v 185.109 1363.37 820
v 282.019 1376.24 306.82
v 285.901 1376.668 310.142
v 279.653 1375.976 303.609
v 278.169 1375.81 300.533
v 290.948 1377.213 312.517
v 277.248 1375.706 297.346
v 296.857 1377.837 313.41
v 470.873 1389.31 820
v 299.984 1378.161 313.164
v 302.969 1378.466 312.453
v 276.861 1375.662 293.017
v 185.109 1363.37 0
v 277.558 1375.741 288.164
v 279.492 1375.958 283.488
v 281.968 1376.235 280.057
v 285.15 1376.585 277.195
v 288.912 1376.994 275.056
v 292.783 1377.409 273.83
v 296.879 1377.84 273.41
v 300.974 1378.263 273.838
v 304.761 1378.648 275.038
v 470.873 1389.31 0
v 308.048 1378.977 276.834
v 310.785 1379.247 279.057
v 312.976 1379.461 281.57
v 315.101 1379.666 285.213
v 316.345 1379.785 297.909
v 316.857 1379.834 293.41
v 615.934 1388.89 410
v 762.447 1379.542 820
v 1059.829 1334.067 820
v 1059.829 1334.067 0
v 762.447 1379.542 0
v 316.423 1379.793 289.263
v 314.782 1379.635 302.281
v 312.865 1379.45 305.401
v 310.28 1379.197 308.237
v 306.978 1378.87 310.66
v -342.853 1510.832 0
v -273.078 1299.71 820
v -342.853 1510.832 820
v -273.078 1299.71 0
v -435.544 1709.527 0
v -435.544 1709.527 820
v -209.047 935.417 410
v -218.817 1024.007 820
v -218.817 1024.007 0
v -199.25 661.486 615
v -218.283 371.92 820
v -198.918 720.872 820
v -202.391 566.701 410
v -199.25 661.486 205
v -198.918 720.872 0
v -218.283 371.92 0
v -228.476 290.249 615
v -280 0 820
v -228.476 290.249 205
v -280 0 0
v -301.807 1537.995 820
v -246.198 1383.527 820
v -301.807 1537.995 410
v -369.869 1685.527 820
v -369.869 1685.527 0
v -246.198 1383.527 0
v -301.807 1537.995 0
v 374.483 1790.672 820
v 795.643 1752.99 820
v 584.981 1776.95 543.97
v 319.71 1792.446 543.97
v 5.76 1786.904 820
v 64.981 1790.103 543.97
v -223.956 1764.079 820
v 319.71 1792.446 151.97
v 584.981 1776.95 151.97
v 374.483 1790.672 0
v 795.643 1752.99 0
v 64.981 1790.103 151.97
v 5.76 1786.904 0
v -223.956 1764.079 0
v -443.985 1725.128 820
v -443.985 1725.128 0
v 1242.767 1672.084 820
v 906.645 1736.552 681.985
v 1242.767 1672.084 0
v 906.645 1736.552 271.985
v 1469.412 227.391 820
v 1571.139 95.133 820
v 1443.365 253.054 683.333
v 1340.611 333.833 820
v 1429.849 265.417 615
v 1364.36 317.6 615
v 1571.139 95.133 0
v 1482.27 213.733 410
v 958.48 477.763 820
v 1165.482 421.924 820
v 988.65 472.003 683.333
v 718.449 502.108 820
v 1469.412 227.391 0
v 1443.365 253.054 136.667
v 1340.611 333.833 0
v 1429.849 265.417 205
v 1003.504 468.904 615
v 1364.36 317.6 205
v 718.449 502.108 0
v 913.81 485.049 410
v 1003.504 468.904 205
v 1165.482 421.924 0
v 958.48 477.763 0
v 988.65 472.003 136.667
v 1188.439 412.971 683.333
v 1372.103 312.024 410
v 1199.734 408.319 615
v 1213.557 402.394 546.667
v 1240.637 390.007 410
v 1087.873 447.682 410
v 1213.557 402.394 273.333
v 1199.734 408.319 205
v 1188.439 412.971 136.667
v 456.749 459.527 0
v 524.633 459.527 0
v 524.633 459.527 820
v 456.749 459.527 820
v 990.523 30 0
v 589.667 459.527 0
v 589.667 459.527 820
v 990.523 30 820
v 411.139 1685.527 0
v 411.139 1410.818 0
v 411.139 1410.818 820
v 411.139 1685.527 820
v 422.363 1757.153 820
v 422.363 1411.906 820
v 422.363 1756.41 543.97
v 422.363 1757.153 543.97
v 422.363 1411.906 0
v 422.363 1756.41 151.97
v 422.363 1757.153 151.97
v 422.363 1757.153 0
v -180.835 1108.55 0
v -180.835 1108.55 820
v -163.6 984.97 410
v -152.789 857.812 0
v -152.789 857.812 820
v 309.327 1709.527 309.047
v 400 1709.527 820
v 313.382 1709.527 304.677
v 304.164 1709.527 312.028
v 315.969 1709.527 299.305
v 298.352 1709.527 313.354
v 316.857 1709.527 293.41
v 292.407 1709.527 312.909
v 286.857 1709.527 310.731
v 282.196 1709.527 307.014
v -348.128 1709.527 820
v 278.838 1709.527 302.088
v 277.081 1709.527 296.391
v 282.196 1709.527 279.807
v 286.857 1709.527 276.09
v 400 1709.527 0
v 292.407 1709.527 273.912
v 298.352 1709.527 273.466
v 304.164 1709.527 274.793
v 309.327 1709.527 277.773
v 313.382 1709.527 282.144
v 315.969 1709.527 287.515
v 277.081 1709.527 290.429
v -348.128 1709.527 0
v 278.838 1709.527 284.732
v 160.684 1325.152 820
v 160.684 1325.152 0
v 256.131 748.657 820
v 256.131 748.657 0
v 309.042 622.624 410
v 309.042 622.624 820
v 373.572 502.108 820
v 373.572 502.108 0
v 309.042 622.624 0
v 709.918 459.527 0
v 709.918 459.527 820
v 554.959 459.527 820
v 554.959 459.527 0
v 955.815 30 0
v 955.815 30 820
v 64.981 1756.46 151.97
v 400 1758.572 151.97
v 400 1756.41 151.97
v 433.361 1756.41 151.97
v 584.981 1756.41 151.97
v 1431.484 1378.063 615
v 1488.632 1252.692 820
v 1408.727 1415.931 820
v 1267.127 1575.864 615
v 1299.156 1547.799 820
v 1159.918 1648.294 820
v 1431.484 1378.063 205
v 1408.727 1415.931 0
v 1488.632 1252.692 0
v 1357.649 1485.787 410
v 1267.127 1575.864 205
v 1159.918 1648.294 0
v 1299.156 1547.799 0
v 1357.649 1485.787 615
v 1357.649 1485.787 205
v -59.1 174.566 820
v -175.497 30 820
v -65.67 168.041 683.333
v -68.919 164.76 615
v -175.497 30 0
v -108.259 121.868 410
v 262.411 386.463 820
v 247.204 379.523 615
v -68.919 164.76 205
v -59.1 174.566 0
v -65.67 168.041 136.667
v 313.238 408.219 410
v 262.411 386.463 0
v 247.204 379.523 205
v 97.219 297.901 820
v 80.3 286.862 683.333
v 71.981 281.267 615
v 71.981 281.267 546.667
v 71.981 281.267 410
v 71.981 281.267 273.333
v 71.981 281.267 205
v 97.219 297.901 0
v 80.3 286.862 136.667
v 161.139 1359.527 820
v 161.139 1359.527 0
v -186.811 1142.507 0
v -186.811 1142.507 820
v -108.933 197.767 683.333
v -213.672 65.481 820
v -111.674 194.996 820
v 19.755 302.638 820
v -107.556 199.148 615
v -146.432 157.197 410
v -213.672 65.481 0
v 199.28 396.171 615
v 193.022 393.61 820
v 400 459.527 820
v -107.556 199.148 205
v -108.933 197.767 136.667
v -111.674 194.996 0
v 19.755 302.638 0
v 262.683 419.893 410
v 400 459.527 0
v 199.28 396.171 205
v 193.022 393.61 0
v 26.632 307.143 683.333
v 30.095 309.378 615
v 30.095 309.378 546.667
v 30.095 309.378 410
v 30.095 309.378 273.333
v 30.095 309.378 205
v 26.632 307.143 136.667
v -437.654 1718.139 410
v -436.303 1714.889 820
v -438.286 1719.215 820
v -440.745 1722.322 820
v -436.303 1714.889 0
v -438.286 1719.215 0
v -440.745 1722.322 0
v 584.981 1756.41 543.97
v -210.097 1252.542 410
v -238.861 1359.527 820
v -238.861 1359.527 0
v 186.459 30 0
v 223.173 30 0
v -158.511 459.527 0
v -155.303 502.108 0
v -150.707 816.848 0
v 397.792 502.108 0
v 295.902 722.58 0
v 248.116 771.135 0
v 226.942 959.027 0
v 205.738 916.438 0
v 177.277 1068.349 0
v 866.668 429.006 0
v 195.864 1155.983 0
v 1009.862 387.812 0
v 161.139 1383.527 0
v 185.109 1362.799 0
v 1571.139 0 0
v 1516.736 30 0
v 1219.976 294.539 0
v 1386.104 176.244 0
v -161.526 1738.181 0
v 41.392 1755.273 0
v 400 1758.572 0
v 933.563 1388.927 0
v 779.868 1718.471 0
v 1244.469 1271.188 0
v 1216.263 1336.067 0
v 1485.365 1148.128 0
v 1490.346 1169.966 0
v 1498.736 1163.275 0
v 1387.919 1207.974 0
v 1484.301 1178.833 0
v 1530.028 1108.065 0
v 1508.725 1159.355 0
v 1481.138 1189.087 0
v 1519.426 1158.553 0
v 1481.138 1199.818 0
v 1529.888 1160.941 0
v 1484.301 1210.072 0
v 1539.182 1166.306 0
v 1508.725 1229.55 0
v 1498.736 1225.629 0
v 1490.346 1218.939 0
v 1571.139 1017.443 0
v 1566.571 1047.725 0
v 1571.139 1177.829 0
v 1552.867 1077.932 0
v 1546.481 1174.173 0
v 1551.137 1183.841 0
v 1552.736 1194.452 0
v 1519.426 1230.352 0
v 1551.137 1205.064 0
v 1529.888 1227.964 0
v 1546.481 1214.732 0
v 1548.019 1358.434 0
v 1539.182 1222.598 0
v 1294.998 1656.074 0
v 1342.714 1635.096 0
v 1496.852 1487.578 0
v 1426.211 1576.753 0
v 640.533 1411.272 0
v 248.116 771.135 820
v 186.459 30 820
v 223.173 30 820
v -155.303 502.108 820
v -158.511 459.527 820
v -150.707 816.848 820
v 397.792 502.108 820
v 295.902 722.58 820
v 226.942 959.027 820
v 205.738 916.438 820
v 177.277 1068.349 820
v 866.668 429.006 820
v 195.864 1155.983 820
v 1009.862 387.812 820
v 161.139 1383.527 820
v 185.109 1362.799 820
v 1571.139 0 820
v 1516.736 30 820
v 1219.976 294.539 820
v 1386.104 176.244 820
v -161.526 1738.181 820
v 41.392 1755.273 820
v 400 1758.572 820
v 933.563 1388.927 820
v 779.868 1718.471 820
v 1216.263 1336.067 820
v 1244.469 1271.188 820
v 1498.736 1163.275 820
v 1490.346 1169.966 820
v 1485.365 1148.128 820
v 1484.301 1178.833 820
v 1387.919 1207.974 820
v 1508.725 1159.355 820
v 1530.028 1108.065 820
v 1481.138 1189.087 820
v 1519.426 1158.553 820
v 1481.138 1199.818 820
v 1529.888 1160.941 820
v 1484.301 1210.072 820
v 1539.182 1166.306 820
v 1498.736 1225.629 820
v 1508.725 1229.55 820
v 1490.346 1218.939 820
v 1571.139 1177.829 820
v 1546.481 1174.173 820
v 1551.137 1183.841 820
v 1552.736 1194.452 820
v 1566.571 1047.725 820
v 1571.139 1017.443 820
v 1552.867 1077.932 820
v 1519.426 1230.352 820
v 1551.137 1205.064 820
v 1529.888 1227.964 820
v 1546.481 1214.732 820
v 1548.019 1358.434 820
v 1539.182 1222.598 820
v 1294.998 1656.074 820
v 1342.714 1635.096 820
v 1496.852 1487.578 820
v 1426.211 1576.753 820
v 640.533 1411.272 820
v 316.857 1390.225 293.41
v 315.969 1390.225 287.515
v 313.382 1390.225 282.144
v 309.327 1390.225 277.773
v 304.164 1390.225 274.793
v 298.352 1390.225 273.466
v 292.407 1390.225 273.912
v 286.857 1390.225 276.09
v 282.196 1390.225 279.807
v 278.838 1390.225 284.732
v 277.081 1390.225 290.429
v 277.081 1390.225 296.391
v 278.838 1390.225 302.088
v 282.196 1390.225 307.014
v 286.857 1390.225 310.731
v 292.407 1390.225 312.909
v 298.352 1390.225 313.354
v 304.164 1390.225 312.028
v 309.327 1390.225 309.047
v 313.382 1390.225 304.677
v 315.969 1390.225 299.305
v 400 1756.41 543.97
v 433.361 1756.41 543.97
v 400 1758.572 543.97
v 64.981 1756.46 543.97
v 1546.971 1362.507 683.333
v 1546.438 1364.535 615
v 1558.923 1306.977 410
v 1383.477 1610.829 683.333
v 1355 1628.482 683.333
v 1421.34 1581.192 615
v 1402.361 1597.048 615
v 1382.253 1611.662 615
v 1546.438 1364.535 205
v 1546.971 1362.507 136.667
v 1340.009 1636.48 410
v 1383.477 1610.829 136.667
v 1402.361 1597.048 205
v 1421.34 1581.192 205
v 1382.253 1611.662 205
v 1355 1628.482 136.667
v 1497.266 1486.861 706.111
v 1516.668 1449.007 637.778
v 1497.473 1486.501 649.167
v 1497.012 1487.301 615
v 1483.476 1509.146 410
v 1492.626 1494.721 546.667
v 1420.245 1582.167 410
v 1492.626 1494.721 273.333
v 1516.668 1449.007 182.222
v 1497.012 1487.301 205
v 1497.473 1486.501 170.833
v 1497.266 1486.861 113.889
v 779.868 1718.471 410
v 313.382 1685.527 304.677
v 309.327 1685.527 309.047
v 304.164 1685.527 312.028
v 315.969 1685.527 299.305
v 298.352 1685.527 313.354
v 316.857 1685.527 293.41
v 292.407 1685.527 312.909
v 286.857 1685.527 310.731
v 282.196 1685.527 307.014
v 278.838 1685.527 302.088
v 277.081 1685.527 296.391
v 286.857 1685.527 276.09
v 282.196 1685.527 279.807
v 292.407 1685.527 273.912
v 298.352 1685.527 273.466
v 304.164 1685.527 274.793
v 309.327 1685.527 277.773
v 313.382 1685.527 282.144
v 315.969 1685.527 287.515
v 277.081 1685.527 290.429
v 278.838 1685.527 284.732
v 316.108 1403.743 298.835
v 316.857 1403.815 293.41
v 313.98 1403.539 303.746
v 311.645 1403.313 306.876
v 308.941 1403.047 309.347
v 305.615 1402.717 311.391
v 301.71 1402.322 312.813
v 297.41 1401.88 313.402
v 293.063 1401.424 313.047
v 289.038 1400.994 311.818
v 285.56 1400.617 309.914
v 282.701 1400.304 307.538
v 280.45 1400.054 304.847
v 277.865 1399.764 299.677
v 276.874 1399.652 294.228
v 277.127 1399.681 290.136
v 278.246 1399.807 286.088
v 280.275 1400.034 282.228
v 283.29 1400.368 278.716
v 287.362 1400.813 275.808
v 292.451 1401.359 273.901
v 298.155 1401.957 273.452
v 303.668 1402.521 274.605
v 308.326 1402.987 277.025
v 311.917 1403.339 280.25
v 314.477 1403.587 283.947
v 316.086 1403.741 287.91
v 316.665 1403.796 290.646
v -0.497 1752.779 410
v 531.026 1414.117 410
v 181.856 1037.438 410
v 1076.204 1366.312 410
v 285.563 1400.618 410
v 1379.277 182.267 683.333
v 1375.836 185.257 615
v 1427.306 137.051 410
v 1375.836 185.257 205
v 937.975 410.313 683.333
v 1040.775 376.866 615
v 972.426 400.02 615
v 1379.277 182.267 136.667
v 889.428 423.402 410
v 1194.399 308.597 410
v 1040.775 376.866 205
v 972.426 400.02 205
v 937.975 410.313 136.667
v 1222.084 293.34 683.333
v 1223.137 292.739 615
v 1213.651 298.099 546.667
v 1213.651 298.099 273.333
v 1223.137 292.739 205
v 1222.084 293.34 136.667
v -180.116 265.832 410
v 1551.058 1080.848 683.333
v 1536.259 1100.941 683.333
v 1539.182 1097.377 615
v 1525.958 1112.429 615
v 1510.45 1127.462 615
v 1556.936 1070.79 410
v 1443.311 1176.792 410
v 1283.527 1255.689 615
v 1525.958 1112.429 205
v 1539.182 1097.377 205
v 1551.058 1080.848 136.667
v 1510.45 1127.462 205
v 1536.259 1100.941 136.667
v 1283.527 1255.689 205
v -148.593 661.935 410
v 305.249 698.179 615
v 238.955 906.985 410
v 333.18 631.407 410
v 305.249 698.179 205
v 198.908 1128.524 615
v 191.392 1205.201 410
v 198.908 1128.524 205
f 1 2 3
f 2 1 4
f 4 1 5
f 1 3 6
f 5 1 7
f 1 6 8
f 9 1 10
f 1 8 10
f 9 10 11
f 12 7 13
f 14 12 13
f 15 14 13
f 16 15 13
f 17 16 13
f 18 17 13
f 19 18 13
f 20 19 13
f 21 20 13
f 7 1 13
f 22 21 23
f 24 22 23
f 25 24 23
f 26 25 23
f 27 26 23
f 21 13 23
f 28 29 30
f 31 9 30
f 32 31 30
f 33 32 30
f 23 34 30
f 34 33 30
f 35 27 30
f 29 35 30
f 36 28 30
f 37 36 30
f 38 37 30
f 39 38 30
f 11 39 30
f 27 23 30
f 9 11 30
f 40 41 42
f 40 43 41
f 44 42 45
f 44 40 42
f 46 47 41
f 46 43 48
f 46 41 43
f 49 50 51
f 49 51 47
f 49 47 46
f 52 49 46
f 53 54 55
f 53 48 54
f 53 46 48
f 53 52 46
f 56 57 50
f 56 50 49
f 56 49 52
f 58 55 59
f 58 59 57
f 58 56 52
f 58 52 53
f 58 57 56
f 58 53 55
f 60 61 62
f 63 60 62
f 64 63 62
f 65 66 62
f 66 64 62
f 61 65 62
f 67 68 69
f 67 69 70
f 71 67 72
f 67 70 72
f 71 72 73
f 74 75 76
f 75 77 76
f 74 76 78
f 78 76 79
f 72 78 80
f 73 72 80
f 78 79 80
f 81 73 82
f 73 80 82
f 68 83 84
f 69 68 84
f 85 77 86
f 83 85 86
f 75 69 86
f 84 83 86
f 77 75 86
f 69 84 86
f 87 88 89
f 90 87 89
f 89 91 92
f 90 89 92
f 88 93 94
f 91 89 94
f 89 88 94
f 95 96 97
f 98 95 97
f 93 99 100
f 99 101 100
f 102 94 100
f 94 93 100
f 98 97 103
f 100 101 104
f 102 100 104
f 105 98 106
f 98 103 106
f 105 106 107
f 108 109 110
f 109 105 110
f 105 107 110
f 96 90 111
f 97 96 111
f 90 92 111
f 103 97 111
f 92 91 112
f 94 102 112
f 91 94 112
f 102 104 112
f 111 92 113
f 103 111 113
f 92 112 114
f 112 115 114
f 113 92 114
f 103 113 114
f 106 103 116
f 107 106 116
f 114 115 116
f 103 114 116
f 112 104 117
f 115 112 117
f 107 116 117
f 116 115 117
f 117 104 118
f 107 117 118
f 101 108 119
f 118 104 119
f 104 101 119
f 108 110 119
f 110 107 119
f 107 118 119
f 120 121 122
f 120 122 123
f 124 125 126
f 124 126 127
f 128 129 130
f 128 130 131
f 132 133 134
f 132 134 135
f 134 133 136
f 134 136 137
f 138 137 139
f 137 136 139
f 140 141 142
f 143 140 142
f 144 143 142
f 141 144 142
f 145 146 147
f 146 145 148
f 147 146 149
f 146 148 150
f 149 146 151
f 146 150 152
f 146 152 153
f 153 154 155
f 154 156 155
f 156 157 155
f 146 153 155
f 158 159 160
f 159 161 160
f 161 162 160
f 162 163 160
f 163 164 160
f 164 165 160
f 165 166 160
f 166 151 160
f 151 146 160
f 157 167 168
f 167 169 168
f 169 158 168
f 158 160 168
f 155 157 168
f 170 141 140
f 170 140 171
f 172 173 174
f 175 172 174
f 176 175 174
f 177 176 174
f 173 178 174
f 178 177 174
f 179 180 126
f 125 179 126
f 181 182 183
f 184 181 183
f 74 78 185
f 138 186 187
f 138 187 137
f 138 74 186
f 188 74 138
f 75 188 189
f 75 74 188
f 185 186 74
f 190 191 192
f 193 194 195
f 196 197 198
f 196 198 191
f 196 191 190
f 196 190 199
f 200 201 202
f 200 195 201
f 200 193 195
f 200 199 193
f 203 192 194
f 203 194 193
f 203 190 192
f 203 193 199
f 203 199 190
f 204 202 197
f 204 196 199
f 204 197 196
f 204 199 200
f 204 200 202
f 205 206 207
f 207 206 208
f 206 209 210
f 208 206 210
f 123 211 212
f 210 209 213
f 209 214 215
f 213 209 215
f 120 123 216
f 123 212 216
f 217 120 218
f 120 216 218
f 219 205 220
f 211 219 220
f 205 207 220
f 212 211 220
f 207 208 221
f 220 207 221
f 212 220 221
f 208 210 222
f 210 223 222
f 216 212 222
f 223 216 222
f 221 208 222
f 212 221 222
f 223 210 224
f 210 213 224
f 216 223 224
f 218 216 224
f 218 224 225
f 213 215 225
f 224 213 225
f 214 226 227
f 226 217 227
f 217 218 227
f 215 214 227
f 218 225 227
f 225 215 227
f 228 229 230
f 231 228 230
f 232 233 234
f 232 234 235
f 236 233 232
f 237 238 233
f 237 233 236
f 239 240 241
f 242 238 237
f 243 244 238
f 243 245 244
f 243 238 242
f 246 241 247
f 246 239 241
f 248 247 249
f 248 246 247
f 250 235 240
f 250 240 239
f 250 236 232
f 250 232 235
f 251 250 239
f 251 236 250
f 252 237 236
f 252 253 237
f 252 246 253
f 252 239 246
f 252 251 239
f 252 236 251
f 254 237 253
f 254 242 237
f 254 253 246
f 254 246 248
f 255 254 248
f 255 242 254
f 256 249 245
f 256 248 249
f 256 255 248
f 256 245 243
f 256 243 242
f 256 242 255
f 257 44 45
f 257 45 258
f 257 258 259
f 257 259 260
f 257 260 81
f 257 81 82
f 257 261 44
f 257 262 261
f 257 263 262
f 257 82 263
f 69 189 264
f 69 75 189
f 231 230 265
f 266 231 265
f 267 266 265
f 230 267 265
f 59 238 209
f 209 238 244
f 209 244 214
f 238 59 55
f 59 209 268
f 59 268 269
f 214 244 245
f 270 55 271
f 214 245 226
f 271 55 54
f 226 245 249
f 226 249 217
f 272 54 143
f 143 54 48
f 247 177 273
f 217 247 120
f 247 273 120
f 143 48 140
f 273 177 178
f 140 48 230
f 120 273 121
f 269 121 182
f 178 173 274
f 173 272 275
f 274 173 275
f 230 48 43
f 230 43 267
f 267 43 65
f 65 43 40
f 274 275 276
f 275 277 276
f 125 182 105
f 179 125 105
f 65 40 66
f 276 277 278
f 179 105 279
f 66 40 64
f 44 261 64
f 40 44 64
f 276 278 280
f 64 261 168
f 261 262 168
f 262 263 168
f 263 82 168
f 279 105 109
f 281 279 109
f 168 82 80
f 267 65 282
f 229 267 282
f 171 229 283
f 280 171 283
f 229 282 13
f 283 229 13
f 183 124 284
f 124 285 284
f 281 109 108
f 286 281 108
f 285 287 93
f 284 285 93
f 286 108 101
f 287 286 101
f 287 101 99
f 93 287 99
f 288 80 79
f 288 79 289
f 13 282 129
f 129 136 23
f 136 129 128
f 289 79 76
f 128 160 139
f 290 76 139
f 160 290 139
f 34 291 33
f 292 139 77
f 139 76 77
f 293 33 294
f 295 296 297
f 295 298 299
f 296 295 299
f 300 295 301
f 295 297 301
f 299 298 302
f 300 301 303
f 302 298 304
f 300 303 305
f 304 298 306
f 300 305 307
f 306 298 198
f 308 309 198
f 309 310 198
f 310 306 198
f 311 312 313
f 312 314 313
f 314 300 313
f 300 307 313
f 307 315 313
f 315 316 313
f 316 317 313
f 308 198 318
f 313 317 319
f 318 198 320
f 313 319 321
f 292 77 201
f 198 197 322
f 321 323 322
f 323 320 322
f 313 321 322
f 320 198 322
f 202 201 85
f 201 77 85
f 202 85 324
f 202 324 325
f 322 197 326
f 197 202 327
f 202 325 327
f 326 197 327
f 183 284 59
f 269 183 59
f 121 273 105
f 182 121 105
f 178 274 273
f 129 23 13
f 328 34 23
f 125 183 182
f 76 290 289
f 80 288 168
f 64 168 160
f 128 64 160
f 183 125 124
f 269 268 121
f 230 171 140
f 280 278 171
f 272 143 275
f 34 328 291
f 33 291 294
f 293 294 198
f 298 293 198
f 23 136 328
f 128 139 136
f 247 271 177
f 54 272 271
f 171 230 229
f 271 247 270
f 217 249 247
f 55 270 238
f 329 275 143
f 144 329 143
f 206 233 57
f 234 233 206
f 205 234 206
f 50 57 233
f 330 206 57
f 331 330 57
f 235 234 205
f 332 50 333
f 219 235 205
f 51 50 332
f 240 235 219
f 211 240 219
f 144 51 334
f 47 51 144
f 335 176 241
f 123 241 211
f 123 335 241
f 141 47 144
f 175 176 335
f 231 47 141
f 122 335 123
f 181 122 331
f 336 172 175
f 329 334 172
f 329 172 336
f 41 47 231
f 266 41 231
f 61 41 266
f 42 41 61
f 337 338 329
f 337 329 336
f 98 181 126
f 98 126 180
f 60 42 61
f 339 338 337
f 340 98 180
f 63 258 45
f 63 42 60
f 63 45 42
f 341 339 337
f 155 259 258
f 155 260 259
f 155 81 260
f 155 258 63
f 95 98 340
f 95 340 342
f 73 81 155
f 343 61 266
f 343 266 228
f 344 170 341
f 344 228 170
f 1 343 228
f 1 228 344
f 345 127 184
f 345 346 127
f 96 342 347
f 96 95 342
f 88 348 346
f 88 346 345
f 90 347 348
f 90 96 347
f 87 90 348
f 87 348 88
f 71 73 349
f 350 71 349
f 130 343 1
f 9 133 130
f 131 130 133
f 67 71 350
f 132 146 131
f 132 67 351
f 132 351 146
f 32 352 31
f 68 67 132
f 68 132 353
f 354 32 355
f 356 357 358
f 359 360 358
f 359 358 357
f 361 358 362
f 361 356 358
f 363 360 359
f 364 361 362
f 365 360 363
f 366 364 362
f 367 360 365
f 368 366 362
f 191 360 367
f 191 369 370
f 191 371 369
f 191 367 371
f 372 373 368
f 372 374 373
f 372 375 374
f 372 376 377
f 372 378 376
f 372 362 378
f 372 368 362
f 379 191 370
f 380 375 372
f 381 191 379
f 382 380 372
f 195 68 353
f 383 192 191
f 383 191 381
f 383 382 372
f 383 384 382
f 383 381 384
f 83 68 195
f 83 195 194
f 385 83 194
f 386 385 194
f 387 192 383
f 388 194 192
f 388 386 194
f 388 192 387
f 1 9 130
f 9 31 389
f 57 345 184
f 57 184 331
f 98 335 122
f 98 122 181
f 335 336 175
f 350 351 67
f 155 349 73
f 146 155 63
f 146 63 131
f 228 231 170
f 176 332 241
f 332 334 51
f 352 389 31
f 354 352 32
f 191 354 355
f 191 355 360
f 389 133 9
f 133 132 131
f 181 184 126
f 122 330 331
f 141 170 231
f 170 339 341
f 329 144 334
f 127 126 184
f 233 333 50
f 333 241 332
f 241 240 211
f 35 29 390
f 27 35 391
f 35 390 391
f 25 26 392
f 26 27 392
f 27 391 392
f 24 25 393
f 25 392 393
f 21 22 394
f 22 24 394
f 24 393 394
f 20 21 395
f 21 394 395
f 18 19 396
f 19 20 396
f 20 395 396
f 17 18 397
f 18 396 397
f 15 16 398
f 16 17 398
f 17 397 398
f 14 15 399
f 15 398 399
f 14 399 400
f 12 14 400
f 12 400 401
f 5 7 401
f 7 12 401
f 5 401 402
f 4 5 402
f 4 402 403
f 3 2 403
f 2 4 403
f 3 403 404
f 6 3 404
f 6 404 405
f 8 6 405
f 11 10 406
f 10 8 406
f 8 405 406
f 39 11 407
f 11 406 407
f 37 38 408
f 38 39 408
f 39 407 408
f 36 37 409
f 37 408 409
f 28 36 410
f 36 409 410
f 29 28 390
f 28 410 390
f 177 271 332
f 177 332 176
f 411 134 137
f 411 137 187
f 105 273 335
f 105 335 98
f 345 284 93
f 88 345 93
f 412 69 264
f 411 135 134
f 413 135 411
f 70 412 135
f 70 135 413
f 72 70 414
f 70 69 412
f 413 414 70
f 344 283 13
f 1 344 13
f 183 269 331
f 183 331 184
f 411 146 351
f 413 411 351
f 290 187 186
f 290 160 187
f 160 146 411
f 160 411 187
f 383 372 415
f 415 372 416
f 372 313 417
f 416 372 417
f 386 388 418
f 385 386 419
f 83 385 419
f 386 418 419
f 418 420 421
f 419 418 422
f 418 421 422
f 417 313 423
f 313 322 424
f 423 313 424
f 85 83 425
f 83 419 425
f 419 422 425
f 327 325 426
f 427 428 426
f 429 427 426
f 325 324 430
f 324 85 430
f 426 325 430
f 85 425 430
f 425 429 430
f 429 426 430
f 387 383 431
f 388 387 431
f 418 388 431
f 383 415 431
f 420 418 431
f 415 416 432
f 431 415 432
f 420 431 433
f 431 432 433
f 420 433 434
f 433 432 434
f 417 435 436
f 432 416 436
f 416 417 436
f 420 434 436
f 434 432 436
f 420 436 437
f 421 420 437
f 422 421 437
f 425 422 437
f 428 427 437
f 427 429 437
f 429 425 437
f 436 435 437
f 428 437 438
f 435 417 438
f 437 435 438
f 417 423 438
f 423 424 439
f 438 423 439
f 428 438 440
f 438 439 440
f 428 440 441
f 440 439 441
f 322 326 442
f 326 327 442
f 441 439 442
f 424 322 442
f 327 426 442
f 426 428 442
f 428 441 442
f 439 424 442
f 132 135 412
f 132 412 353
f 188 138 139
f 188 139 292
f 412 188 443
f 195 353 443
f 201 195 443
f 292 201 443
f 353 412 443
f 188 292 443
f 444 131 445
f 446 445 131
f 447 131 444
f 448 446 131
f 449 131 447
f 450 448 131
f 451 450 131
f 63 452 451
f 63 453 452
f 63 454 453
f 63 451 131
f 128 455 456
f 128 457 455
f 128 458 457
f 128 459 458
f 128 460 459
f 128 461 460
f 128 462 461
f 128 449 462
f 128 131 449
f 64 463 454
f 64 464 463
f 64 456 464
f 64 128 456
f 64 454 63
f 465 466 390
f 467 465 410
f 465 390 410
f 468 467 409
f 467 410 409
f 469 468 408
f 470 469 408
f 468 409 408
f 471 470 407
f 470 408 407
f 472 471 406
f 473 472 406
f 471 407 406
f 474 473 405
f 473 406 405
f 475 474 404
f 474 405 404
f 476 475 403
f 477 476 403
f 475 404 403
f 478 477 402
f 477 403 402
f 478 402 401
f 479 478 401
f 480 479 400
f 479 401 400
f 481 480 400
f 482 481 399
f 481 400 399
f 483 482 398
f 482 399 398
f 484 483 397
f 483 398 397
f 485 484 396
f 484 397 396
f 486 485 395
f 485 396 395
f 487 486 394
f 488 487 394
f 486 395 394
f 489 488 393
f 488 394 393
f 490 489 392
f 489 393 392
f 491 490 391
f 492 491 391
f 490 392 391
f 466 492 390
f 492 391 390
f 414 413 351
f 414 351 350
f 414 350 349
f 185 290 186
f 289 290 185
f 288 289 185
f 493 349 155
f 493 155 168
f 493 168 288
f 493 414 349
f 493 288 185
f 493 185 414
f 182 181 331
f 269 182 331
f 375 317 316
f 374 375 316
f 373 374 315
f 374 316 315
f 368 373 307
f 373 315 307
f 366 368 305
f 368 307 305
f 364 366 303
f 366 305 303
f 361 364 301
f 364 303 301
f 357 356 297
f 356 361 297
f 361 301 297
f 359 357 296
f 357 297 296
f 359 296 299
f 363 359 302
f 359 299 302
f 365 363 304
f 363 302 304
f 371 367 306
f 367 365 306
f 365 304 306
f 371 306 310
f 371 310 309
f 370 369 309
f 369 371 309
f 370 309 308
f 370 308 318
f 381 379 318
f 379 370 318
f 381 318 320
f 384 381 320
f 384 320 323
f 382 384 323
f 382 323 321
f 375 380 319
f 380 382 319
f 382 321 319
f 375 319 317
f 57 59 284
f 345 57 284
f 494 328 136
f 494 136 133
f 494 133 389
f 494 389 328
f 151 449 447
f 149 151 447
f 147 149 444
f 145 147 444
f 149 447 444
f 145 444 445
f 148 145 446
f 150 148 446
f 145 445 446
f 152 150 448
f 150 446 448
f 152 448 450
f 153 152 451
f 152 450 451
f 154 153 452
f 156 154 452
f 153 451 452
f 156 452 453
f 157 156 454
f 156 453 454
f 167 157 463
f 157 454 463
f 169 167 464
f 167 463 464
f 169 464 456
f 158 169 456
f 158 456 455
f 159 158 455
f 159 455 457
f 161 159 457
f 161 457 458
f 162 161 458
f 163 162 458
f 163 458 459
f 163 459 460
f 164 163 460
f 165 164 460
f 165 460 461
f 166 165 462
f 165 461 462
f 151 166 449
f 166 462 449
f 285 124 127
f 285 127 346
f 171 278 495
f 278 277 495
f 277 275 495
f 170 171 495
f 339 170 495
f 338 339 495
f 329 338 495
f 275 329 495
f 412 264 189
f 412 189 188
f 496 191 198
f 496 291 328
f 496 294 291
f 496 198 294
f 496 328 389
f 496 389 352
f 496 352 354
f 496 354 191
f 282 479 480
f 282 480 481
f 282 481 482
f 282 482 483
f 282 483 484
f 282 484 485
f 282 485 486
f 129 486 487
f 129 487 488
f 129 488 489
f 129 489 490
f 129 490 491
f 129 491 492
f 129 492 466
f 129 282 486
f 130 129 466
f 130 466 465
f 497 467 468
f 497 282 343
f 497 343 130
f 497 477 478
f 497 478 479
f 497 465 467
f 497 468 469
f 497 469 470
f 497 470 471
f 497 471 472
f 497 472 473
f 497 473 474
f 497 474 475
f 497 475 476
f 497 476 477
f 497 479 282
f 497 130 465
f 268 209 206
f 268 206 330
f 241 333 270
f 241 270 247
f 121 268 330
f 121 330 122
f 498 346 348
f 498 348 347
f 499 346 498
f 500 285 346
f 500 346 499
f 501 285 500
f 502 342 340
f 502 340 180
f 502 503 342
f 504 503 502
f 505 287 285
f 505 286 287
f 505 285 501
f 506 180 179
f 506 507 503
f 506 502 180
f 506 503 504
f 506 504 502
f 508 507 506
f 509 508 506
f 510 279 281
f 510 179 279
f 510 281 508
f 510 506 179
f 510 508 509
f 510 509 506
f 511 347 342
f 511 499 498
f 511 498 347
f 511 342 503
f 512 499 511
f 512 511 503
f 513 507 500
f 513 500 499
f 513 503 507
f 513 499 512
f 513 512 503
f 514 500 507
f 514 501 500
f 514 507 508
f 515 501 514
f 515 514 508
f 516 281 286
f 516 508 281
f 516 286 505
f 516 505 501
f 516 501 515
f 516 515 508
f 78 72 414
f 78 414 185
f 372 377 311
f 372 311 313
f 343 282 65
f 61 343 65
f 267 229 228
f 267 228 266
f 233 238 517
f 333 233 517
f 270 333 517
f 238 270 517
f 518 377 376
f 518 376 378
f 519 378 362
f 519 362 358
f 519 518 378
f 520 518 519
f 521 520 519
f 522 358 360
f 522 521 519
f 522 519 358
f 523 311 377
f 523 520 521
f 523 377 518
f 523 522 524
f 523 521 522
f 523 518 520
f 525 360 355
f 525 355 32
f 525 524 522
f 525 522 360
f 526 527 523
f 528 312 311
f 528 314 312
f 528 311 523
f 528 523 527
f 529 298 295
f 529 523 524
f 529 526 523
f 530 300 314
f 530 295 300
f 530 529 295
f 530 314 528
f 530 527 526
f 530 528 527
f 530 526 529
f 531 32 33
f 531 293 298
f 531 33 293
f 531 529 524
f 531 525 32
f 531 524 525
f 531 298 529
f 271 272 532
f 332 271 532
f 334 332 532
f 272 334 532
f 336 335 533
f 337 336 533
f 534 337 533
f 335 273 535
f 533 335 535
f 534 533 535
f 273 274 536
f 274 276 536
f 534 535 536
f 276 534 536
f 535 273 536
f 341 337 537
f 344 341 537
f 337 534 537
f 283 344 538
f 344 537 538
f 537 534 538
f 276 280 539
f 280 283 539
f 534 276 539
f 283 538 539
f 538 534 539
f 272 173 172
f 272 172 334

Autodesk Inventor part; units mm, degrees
ref_plane "YZ Plane" through (0, 0, 0) normal (1, 0, 0) x (0, 1, 0)
sketch "Sketch1" plane through (0, 0, 0) normal (0, 0, 1) x (1, 0, 0)
  line L0 (161.1386, 1359.5266) -> (-238.8614, 1359.5266)
  line L1 (161.1386, 1359.5266) -> (-238.8612, 1359.5253)
  line L2 (161.1386, 1359.5266) -> (-238.8613, 1359.5262)
  line L3 (161.1386, 1359.5266) -> (-186.8113, 1142.5066)
  line L4 (248.1161, 771.1351) -> (-152.7891, 857.8121)
  line L5 (-158.5114, 459.5266) -> (400, 459.5266)
  line L6 (-32.9752, 356.2519) -> (400, 459.5266) construction
  spline S0 degree 2 poles (-213.6716, 65.4814) (-32.9752, 356.2519) (400, 459.5266) knots 1.098111 1.098111 1.098111 2 2 2
  line L7 (554.959, 459.5266) -> (223.1733, 30)
  line L8 (554.959, 459.5266) -> (955.815, 30)
  line L9 (400, 1709.5266) -> (-348.1283, 1709.5266)
  line L10 (1559.9999, 1359.5314) -> (1560, 1359.5266)
  line L11 (411.1386, 1410.8176) -> (411.1386, 1509.5266)
  spline S1 degree 2 poles (185.1086, 1363.3695) (609.3989, 1429.0606) (1059.8291, 1334.0674) knots 1.017817 1.017817 1.017817 1.648016 1.648016 1.648016
  line L12 (161.1386, 1383.5266) -> (284.9875, 1404.0635) construction
  spline S2 degree 2 poles (1488.6321, 1252.6922) (1391.0237, 1521.0798) (1159.9182, 1648.2945) knots 1.336028 1.336028 1.336028 1.795606 1.795606 1.795606
  line L13 (1391.0237, 1521.0798) -> (1159.9182, 1648.2945) construction
  line L14 (768.5954, 1734.2188) -> (1159.9182, 1648.2945) construction
  line L15 (1571.1386, 1017.4432) -> (1571.1386, 1177.8289) construction
  line L16 (1571.1386, 1177.8289) -> (1059.8291, 1334.0674) construction
  spline S3 degree 2 poles (1571.1386, 1017.4432) (1571.1386, 1177.8289) (1059.8291, 1334.0674) knots 1 1 1 2 2 2
  line L17 (609.3989, 1429.0606) -> (1059.8291, 1334.0674) construction
  line L18 (1571.1386, 1177.8289) -> (1560, 1593.335) construction
  line L19 (1560, 1593.335) -> (1242.767, 1672.0837) construction
  spline S4 degree 2 poles (1571.1386, 1177.8289) (1560, 1593.335) (1242.767, 1672.0837) knots 1 1 1 2 2 2
  line L20 (1087.8258, 1400.6409) -> (1488.6321, 1252.6922) construction
  spline S5 degree 2 poles (640.5331, 1411.2721) (1087.8258, 1400.6409) (1488.6321, 1252.6922) knots 1.347915 1.347915 1.347915 2 2 2
  line L21 (1488.6321, 1252.6922) -> (1391.0237, 1521.0798) construction
  line L22 (530.6033, 1416.646) -> (640.5331, 1411.2721) construction
  line L23 (640.5331, 1411.2721) -> (1087.8258, 1400.6409) construction
  line L24 (422.363, 1411.9058) -> (422.363, 1757.1534)
  line L25 (411.1386, 1685.5266) -> (-369.8693, 1685.5266)
  line L26 (-295.5796, 1541.4626) -> (-369.8693, 1685.5266) construction
  line L27 (411.1386, 1509.5266) -> (411.1386, 1685.5266)
  line L28 (400, 1709.5266) -> (400, 1758.5718)
  spline S6 degree 2 poles (422.363, 1757.1534) (768.5954, 1734.2188) (1159.9182, 1648.2945) knots 1.466086 1.466086 1.466086 1.822751 1.822751 1.822751
  line L29 (422.363, 1757.1534) -> (768.5954, 1734.2188) construction
  spline S7 degree 2 poles (161.1386, 1383.5266) (284.9875, 1404.0635) (411.1386, 1410.8176) knots 1 1 1 1.184521 1.184521 1.184521
  spline S8 degree 2 poles (422.363, 1411.9058) (530.6033, 1416.646) (640.5331, 1411.2721) knots 1.200863 1.200863 1.200863 1.358931 1.358931 1.358931
  line L30 (284.9875, 1404.0635) -> (411.1386, 1410.8176) construction
  line L31 (422.363, 1411.9058) -> (530.6033, 1416.646) construction
  line L32 (161.1386, 1383.5266) -> (-246.1978, 1383.5266)
  spline S9 degree 2 poles (-246.1978, 1383.5266) (-295.5796, 1541.4626) (-369.8693, 1685.5266) knots 1.776248 1.776248 1.776248 1.982731 1.982731 1.982731
  line L33 (-207.3568, 1254.0684) -> (-238.8614, 1359.5266) construction
  line L34 (-246.1978, 1383.5266) -> (-295.5796, 1541.4626) construction
  line L35 (-30.322, 1016.0709) -> (-60.322, 1016.0709)
  line L36 (-280, 0) -> (-60.322, 1016.0709) construction
  line L37 (-60.322, 1016.0709) -> (-435.5436, 1709.5266) construction
  spline S10 degree 2 poles (-280, 0) (-60.322, 1016.0709) (-435.5436, 1709.5266) knots 1 1 1 2 2 2
  line L38 (1242.767, 1672.0837) -> (287.4624, 1884.9388) construction
  line L39 (287.4624, 1884.9388) -> (-443.9851, 1725.1277) construction
  spline S11 degree 2 poles (1242.767, 1672.0837) (287.4624, 1884.9388) (-443.9851, 1725.1277) knots 1 1 1 2 2 2
  line L40 (-435.5436, 1709.5266) -> (-435.5436, 1718.9513) construction
  line L41 (-435.5436, 1718.9513) -> (-443.9851, 1725.1277) construction
  spline S12 degree 2 poles (-435.5436, 1709.5266) (-435.5436, 1718.9513) (-443.9851, 1725.1277) knots 1 1 1 2 2 2
  line L42 (400, 1758.5718) -> (-26.9296, 1771.5095) construction
  line L43 (-26.9296, 1771.5095) -> (-348.1283, 1709.5266) construction
  spline S13 degree 2 poles (400, 1758.5718) (-26.9296, 1771.5095) (-348.1283, 1709.5266) knots 1 1 1 2 2 2
  line L44 (-213.6716, 65.4814) -> (-32.9752, 356.2519) construction
  line L45 (186.4589, 881.5156) -> (185.1086, 1362.7988) construction
  spline S14 degree 2 poles (397.7918, 502.1083) (186.4589, 881.5156) (185.1086, 1362.7988) knots 1.053519 1.053519 1.053519 2 2 2
  line L46 (185.1086, 1362.7988) -> (185.1086, 1363.3695)
  line L47 (185.1086, 1363.3695) -> (609.3989, 1429.0606) construction
  line L48 (-180.8353, 1108.5501) -> (163.0717, 1326.6666)
  line L49 (160.6844, 1325.1525) -> (159.3113, 1026.732) construction
  spline S15 degree 2 poles (-186.8113, 1142.5066) (-207.3568, 1254.0684) (-238.8614, 1359.5266) knots 1.623647 1.623647 1.623647 1.760611 1.760611 1.760611
  line L50 (-160.3886, 986.7586) -> (-180.8353, 1108.5501) construction
  line L51 (-186.8113, 1142.5066) -> (-207.3568, 1254.0684) construction
  line L52 (256.1307, 748.6567) -> (-150.7068, 816.8479)
  spline S16 degree 2 poles (-152.7891, 857.8121) (-160.3886, 986.7586) (-180.8353, 1108.5501) knots 1.454595 1.454595 1.454595 1.602889 1.602889 1.602889
  line L53 (-144.1812, 664.3923) -> (-150.7068, 816.8479) construction
  line L54 (-152.7891, 857.8121) -> (-160.3886, 986.7586) construction
  spline S17 degree 2 poles (160.6844, 1325.1525) (159.3113, 1026.732) (248.1161, 771.1351) knots 1.033706 1.033706 1.033706 1.621351 1.621351 1.621351
  spline S18 degree 2 poles (256.1307, 748.6567) (303.2321, 619.8647) (373.5724, 502.1083) knots 1.647287 1.647287 1.647287 1.945599 1.945599 1.945599
  line L55 (159.3113, 1026.732) -> (248.1161, 771.1351) construction
  line L56 (256.1307, 748.6567) -> (303.2321, 619.8647) construction
  line L57 (-155.3033, 502.1083) -> (373.5724, 502.1083)
  line L58 (303.2321, 619.8647) -> (373.5724, 502.1083) construction
  spline S19 degree 2 poles (-213.6716, 65.4814) (-174.1396, 269.1604) (-158.5114, 459.5266) knots 1.032347 1.032347 1.032347 1.234626 1.234626 1.234626
  spline S20 degree 2 poles (-155.3033, 502.1083) (-144.1812, 664.3923) (-150.7068, 816.8479) knots 1.257338 1.257338 1.257338 1.431143 1.431143 1.431143
  line L59 (-174.1396, 269.1604) -> (-158.5114, 459.5266) construction
  line L60 (-155.3033, 502.1083) -> (-144.1812, 664.3923) construction
  line L61 (-175.497, 30) -> (3.3356, 317.7714) construction
  line L62 (3.3356, 317.7714) -> (456.7489, 459.5266) construction
  spline S21 degree 2 poles (-175.497, 30) (3.3356, 317.7714) (456.7489, 459.5266) knots 1 1 1 2 2 2
  line L63 (397.7918, 502.1083) -> (718.4486, 502.1083)
  line L64 (1571.1386, 95.1334) -> (1336.4814, 481.3927) construction
  line L65 (1336.4814, 481.3927) -> (718.4486, 502.1083) construction
  spline S22 degree 2 poles (1571.1386, 95.1334) (1336.4814, 481.3927) (718.4486, 502.1083) knots 1 1 1 2 2 2
  line L66 (397.7918, 502.1083) -> (186.4589, 881.5156) construction
  line L67 (1516.7362, 30) -> (1275.4709, 372.4307) construction
  line L68 (1275.4709, 372.4307) -> (709.9179, 459.5266) construction
  spline S23 degree 2 poles (1516.7362, 30) (1275.4709, 372.4307) (709.9179, 459.5266) knots 1 1 1 2 2 2
  line L69 (-213.6716, 65.4814) -> (-174.1396, 269.1604) construction
  line L70 (1571.1386, 0) -> (1571.1386, 95.1334)
  line L71 (1571.1386, 1017.4432) -> (1571.1386, 1177.8289)
  line L72 (186.4589, 30) -> (524.6326, 459.5266)
  line L73 (589.667, 459.5266) -> (990.523, 30)
  line L74 (709.9179, 459.5266) -> (589.667, 459.5266)
  line L75 (524.6326, 459.5266) -> (456.7489, 459.5266)
  line L76 (-175.497, 30) -> (186.4589, 30)
  line L77 (223.1733, 30) -> (955.815, 30)
  line L78 (990.523, 30) -> (1516.7362, 30)
  circle A0 centre (1516.7362, 1194.4524) radius 36
  line L79 (-280, 0) -> (1571.1386, 0)
  point P0 (390.9108, 1423.4749)
  point P1 (271.3597, 1843.399)
  point P2 (-16.2977, 999.8731)
  point P3 (-67.3038, 785.2568)
  point P4 (158.4265, 834.4446)
  point P5 (-99.7467, 625.5419)
  point P6 (-135.0742, 451.6261)
  dimension "d13" = 400
  dimension "d25" = 30
  dimension "d27" = 72
extrude "Extrusion1" add sketch "Sketch1" along normal blind 820
ref_plane "Work Plane1" through (224.5173, 1793.6598, 410) normal (0, 1, 0) x (-1, 0, 0)
sketch "Sketch2" plane through (224.5173, 1793.6598, 410) normal (0, 1, 0) x (-1, 0, 0)
  line L0 (159.536, -258.0302) -> (-360.464, -258.0302)
  line L1 (-360.464, -258.0302) -> (-360.464, 133.9698)
  line L2 (-360.464, 133.9698) -> (159.536, 133.9698)
  line L3 (159.536, 133.9698) -> (159.536, -258.0302)
  point P0 (224.5173, -410)
  dimension "d30" = 520
  dimension "d31" = 392
extrude "Extrusion2" cut sketch "Sketch2" against normal blind 37.25
ref_plane "Work Plane2" through (536.3949, 1390.2254, 410) normal (0, -1, 0) x (1, 0, 0)
sketch "Sketch3" plane through (536.3949, 1390.2254, 410) normal (0, -1, 0) x (1, 0, 0)
  circle A0 centre (-239.5375, -116.5899) radius 20
  point P0 (-536.3949, -410)
  dimension "d34" = 40
extrude "Extrusion3" cut sketch "Sketch3" along normal mid plane 874.75
properties part number "silla"
